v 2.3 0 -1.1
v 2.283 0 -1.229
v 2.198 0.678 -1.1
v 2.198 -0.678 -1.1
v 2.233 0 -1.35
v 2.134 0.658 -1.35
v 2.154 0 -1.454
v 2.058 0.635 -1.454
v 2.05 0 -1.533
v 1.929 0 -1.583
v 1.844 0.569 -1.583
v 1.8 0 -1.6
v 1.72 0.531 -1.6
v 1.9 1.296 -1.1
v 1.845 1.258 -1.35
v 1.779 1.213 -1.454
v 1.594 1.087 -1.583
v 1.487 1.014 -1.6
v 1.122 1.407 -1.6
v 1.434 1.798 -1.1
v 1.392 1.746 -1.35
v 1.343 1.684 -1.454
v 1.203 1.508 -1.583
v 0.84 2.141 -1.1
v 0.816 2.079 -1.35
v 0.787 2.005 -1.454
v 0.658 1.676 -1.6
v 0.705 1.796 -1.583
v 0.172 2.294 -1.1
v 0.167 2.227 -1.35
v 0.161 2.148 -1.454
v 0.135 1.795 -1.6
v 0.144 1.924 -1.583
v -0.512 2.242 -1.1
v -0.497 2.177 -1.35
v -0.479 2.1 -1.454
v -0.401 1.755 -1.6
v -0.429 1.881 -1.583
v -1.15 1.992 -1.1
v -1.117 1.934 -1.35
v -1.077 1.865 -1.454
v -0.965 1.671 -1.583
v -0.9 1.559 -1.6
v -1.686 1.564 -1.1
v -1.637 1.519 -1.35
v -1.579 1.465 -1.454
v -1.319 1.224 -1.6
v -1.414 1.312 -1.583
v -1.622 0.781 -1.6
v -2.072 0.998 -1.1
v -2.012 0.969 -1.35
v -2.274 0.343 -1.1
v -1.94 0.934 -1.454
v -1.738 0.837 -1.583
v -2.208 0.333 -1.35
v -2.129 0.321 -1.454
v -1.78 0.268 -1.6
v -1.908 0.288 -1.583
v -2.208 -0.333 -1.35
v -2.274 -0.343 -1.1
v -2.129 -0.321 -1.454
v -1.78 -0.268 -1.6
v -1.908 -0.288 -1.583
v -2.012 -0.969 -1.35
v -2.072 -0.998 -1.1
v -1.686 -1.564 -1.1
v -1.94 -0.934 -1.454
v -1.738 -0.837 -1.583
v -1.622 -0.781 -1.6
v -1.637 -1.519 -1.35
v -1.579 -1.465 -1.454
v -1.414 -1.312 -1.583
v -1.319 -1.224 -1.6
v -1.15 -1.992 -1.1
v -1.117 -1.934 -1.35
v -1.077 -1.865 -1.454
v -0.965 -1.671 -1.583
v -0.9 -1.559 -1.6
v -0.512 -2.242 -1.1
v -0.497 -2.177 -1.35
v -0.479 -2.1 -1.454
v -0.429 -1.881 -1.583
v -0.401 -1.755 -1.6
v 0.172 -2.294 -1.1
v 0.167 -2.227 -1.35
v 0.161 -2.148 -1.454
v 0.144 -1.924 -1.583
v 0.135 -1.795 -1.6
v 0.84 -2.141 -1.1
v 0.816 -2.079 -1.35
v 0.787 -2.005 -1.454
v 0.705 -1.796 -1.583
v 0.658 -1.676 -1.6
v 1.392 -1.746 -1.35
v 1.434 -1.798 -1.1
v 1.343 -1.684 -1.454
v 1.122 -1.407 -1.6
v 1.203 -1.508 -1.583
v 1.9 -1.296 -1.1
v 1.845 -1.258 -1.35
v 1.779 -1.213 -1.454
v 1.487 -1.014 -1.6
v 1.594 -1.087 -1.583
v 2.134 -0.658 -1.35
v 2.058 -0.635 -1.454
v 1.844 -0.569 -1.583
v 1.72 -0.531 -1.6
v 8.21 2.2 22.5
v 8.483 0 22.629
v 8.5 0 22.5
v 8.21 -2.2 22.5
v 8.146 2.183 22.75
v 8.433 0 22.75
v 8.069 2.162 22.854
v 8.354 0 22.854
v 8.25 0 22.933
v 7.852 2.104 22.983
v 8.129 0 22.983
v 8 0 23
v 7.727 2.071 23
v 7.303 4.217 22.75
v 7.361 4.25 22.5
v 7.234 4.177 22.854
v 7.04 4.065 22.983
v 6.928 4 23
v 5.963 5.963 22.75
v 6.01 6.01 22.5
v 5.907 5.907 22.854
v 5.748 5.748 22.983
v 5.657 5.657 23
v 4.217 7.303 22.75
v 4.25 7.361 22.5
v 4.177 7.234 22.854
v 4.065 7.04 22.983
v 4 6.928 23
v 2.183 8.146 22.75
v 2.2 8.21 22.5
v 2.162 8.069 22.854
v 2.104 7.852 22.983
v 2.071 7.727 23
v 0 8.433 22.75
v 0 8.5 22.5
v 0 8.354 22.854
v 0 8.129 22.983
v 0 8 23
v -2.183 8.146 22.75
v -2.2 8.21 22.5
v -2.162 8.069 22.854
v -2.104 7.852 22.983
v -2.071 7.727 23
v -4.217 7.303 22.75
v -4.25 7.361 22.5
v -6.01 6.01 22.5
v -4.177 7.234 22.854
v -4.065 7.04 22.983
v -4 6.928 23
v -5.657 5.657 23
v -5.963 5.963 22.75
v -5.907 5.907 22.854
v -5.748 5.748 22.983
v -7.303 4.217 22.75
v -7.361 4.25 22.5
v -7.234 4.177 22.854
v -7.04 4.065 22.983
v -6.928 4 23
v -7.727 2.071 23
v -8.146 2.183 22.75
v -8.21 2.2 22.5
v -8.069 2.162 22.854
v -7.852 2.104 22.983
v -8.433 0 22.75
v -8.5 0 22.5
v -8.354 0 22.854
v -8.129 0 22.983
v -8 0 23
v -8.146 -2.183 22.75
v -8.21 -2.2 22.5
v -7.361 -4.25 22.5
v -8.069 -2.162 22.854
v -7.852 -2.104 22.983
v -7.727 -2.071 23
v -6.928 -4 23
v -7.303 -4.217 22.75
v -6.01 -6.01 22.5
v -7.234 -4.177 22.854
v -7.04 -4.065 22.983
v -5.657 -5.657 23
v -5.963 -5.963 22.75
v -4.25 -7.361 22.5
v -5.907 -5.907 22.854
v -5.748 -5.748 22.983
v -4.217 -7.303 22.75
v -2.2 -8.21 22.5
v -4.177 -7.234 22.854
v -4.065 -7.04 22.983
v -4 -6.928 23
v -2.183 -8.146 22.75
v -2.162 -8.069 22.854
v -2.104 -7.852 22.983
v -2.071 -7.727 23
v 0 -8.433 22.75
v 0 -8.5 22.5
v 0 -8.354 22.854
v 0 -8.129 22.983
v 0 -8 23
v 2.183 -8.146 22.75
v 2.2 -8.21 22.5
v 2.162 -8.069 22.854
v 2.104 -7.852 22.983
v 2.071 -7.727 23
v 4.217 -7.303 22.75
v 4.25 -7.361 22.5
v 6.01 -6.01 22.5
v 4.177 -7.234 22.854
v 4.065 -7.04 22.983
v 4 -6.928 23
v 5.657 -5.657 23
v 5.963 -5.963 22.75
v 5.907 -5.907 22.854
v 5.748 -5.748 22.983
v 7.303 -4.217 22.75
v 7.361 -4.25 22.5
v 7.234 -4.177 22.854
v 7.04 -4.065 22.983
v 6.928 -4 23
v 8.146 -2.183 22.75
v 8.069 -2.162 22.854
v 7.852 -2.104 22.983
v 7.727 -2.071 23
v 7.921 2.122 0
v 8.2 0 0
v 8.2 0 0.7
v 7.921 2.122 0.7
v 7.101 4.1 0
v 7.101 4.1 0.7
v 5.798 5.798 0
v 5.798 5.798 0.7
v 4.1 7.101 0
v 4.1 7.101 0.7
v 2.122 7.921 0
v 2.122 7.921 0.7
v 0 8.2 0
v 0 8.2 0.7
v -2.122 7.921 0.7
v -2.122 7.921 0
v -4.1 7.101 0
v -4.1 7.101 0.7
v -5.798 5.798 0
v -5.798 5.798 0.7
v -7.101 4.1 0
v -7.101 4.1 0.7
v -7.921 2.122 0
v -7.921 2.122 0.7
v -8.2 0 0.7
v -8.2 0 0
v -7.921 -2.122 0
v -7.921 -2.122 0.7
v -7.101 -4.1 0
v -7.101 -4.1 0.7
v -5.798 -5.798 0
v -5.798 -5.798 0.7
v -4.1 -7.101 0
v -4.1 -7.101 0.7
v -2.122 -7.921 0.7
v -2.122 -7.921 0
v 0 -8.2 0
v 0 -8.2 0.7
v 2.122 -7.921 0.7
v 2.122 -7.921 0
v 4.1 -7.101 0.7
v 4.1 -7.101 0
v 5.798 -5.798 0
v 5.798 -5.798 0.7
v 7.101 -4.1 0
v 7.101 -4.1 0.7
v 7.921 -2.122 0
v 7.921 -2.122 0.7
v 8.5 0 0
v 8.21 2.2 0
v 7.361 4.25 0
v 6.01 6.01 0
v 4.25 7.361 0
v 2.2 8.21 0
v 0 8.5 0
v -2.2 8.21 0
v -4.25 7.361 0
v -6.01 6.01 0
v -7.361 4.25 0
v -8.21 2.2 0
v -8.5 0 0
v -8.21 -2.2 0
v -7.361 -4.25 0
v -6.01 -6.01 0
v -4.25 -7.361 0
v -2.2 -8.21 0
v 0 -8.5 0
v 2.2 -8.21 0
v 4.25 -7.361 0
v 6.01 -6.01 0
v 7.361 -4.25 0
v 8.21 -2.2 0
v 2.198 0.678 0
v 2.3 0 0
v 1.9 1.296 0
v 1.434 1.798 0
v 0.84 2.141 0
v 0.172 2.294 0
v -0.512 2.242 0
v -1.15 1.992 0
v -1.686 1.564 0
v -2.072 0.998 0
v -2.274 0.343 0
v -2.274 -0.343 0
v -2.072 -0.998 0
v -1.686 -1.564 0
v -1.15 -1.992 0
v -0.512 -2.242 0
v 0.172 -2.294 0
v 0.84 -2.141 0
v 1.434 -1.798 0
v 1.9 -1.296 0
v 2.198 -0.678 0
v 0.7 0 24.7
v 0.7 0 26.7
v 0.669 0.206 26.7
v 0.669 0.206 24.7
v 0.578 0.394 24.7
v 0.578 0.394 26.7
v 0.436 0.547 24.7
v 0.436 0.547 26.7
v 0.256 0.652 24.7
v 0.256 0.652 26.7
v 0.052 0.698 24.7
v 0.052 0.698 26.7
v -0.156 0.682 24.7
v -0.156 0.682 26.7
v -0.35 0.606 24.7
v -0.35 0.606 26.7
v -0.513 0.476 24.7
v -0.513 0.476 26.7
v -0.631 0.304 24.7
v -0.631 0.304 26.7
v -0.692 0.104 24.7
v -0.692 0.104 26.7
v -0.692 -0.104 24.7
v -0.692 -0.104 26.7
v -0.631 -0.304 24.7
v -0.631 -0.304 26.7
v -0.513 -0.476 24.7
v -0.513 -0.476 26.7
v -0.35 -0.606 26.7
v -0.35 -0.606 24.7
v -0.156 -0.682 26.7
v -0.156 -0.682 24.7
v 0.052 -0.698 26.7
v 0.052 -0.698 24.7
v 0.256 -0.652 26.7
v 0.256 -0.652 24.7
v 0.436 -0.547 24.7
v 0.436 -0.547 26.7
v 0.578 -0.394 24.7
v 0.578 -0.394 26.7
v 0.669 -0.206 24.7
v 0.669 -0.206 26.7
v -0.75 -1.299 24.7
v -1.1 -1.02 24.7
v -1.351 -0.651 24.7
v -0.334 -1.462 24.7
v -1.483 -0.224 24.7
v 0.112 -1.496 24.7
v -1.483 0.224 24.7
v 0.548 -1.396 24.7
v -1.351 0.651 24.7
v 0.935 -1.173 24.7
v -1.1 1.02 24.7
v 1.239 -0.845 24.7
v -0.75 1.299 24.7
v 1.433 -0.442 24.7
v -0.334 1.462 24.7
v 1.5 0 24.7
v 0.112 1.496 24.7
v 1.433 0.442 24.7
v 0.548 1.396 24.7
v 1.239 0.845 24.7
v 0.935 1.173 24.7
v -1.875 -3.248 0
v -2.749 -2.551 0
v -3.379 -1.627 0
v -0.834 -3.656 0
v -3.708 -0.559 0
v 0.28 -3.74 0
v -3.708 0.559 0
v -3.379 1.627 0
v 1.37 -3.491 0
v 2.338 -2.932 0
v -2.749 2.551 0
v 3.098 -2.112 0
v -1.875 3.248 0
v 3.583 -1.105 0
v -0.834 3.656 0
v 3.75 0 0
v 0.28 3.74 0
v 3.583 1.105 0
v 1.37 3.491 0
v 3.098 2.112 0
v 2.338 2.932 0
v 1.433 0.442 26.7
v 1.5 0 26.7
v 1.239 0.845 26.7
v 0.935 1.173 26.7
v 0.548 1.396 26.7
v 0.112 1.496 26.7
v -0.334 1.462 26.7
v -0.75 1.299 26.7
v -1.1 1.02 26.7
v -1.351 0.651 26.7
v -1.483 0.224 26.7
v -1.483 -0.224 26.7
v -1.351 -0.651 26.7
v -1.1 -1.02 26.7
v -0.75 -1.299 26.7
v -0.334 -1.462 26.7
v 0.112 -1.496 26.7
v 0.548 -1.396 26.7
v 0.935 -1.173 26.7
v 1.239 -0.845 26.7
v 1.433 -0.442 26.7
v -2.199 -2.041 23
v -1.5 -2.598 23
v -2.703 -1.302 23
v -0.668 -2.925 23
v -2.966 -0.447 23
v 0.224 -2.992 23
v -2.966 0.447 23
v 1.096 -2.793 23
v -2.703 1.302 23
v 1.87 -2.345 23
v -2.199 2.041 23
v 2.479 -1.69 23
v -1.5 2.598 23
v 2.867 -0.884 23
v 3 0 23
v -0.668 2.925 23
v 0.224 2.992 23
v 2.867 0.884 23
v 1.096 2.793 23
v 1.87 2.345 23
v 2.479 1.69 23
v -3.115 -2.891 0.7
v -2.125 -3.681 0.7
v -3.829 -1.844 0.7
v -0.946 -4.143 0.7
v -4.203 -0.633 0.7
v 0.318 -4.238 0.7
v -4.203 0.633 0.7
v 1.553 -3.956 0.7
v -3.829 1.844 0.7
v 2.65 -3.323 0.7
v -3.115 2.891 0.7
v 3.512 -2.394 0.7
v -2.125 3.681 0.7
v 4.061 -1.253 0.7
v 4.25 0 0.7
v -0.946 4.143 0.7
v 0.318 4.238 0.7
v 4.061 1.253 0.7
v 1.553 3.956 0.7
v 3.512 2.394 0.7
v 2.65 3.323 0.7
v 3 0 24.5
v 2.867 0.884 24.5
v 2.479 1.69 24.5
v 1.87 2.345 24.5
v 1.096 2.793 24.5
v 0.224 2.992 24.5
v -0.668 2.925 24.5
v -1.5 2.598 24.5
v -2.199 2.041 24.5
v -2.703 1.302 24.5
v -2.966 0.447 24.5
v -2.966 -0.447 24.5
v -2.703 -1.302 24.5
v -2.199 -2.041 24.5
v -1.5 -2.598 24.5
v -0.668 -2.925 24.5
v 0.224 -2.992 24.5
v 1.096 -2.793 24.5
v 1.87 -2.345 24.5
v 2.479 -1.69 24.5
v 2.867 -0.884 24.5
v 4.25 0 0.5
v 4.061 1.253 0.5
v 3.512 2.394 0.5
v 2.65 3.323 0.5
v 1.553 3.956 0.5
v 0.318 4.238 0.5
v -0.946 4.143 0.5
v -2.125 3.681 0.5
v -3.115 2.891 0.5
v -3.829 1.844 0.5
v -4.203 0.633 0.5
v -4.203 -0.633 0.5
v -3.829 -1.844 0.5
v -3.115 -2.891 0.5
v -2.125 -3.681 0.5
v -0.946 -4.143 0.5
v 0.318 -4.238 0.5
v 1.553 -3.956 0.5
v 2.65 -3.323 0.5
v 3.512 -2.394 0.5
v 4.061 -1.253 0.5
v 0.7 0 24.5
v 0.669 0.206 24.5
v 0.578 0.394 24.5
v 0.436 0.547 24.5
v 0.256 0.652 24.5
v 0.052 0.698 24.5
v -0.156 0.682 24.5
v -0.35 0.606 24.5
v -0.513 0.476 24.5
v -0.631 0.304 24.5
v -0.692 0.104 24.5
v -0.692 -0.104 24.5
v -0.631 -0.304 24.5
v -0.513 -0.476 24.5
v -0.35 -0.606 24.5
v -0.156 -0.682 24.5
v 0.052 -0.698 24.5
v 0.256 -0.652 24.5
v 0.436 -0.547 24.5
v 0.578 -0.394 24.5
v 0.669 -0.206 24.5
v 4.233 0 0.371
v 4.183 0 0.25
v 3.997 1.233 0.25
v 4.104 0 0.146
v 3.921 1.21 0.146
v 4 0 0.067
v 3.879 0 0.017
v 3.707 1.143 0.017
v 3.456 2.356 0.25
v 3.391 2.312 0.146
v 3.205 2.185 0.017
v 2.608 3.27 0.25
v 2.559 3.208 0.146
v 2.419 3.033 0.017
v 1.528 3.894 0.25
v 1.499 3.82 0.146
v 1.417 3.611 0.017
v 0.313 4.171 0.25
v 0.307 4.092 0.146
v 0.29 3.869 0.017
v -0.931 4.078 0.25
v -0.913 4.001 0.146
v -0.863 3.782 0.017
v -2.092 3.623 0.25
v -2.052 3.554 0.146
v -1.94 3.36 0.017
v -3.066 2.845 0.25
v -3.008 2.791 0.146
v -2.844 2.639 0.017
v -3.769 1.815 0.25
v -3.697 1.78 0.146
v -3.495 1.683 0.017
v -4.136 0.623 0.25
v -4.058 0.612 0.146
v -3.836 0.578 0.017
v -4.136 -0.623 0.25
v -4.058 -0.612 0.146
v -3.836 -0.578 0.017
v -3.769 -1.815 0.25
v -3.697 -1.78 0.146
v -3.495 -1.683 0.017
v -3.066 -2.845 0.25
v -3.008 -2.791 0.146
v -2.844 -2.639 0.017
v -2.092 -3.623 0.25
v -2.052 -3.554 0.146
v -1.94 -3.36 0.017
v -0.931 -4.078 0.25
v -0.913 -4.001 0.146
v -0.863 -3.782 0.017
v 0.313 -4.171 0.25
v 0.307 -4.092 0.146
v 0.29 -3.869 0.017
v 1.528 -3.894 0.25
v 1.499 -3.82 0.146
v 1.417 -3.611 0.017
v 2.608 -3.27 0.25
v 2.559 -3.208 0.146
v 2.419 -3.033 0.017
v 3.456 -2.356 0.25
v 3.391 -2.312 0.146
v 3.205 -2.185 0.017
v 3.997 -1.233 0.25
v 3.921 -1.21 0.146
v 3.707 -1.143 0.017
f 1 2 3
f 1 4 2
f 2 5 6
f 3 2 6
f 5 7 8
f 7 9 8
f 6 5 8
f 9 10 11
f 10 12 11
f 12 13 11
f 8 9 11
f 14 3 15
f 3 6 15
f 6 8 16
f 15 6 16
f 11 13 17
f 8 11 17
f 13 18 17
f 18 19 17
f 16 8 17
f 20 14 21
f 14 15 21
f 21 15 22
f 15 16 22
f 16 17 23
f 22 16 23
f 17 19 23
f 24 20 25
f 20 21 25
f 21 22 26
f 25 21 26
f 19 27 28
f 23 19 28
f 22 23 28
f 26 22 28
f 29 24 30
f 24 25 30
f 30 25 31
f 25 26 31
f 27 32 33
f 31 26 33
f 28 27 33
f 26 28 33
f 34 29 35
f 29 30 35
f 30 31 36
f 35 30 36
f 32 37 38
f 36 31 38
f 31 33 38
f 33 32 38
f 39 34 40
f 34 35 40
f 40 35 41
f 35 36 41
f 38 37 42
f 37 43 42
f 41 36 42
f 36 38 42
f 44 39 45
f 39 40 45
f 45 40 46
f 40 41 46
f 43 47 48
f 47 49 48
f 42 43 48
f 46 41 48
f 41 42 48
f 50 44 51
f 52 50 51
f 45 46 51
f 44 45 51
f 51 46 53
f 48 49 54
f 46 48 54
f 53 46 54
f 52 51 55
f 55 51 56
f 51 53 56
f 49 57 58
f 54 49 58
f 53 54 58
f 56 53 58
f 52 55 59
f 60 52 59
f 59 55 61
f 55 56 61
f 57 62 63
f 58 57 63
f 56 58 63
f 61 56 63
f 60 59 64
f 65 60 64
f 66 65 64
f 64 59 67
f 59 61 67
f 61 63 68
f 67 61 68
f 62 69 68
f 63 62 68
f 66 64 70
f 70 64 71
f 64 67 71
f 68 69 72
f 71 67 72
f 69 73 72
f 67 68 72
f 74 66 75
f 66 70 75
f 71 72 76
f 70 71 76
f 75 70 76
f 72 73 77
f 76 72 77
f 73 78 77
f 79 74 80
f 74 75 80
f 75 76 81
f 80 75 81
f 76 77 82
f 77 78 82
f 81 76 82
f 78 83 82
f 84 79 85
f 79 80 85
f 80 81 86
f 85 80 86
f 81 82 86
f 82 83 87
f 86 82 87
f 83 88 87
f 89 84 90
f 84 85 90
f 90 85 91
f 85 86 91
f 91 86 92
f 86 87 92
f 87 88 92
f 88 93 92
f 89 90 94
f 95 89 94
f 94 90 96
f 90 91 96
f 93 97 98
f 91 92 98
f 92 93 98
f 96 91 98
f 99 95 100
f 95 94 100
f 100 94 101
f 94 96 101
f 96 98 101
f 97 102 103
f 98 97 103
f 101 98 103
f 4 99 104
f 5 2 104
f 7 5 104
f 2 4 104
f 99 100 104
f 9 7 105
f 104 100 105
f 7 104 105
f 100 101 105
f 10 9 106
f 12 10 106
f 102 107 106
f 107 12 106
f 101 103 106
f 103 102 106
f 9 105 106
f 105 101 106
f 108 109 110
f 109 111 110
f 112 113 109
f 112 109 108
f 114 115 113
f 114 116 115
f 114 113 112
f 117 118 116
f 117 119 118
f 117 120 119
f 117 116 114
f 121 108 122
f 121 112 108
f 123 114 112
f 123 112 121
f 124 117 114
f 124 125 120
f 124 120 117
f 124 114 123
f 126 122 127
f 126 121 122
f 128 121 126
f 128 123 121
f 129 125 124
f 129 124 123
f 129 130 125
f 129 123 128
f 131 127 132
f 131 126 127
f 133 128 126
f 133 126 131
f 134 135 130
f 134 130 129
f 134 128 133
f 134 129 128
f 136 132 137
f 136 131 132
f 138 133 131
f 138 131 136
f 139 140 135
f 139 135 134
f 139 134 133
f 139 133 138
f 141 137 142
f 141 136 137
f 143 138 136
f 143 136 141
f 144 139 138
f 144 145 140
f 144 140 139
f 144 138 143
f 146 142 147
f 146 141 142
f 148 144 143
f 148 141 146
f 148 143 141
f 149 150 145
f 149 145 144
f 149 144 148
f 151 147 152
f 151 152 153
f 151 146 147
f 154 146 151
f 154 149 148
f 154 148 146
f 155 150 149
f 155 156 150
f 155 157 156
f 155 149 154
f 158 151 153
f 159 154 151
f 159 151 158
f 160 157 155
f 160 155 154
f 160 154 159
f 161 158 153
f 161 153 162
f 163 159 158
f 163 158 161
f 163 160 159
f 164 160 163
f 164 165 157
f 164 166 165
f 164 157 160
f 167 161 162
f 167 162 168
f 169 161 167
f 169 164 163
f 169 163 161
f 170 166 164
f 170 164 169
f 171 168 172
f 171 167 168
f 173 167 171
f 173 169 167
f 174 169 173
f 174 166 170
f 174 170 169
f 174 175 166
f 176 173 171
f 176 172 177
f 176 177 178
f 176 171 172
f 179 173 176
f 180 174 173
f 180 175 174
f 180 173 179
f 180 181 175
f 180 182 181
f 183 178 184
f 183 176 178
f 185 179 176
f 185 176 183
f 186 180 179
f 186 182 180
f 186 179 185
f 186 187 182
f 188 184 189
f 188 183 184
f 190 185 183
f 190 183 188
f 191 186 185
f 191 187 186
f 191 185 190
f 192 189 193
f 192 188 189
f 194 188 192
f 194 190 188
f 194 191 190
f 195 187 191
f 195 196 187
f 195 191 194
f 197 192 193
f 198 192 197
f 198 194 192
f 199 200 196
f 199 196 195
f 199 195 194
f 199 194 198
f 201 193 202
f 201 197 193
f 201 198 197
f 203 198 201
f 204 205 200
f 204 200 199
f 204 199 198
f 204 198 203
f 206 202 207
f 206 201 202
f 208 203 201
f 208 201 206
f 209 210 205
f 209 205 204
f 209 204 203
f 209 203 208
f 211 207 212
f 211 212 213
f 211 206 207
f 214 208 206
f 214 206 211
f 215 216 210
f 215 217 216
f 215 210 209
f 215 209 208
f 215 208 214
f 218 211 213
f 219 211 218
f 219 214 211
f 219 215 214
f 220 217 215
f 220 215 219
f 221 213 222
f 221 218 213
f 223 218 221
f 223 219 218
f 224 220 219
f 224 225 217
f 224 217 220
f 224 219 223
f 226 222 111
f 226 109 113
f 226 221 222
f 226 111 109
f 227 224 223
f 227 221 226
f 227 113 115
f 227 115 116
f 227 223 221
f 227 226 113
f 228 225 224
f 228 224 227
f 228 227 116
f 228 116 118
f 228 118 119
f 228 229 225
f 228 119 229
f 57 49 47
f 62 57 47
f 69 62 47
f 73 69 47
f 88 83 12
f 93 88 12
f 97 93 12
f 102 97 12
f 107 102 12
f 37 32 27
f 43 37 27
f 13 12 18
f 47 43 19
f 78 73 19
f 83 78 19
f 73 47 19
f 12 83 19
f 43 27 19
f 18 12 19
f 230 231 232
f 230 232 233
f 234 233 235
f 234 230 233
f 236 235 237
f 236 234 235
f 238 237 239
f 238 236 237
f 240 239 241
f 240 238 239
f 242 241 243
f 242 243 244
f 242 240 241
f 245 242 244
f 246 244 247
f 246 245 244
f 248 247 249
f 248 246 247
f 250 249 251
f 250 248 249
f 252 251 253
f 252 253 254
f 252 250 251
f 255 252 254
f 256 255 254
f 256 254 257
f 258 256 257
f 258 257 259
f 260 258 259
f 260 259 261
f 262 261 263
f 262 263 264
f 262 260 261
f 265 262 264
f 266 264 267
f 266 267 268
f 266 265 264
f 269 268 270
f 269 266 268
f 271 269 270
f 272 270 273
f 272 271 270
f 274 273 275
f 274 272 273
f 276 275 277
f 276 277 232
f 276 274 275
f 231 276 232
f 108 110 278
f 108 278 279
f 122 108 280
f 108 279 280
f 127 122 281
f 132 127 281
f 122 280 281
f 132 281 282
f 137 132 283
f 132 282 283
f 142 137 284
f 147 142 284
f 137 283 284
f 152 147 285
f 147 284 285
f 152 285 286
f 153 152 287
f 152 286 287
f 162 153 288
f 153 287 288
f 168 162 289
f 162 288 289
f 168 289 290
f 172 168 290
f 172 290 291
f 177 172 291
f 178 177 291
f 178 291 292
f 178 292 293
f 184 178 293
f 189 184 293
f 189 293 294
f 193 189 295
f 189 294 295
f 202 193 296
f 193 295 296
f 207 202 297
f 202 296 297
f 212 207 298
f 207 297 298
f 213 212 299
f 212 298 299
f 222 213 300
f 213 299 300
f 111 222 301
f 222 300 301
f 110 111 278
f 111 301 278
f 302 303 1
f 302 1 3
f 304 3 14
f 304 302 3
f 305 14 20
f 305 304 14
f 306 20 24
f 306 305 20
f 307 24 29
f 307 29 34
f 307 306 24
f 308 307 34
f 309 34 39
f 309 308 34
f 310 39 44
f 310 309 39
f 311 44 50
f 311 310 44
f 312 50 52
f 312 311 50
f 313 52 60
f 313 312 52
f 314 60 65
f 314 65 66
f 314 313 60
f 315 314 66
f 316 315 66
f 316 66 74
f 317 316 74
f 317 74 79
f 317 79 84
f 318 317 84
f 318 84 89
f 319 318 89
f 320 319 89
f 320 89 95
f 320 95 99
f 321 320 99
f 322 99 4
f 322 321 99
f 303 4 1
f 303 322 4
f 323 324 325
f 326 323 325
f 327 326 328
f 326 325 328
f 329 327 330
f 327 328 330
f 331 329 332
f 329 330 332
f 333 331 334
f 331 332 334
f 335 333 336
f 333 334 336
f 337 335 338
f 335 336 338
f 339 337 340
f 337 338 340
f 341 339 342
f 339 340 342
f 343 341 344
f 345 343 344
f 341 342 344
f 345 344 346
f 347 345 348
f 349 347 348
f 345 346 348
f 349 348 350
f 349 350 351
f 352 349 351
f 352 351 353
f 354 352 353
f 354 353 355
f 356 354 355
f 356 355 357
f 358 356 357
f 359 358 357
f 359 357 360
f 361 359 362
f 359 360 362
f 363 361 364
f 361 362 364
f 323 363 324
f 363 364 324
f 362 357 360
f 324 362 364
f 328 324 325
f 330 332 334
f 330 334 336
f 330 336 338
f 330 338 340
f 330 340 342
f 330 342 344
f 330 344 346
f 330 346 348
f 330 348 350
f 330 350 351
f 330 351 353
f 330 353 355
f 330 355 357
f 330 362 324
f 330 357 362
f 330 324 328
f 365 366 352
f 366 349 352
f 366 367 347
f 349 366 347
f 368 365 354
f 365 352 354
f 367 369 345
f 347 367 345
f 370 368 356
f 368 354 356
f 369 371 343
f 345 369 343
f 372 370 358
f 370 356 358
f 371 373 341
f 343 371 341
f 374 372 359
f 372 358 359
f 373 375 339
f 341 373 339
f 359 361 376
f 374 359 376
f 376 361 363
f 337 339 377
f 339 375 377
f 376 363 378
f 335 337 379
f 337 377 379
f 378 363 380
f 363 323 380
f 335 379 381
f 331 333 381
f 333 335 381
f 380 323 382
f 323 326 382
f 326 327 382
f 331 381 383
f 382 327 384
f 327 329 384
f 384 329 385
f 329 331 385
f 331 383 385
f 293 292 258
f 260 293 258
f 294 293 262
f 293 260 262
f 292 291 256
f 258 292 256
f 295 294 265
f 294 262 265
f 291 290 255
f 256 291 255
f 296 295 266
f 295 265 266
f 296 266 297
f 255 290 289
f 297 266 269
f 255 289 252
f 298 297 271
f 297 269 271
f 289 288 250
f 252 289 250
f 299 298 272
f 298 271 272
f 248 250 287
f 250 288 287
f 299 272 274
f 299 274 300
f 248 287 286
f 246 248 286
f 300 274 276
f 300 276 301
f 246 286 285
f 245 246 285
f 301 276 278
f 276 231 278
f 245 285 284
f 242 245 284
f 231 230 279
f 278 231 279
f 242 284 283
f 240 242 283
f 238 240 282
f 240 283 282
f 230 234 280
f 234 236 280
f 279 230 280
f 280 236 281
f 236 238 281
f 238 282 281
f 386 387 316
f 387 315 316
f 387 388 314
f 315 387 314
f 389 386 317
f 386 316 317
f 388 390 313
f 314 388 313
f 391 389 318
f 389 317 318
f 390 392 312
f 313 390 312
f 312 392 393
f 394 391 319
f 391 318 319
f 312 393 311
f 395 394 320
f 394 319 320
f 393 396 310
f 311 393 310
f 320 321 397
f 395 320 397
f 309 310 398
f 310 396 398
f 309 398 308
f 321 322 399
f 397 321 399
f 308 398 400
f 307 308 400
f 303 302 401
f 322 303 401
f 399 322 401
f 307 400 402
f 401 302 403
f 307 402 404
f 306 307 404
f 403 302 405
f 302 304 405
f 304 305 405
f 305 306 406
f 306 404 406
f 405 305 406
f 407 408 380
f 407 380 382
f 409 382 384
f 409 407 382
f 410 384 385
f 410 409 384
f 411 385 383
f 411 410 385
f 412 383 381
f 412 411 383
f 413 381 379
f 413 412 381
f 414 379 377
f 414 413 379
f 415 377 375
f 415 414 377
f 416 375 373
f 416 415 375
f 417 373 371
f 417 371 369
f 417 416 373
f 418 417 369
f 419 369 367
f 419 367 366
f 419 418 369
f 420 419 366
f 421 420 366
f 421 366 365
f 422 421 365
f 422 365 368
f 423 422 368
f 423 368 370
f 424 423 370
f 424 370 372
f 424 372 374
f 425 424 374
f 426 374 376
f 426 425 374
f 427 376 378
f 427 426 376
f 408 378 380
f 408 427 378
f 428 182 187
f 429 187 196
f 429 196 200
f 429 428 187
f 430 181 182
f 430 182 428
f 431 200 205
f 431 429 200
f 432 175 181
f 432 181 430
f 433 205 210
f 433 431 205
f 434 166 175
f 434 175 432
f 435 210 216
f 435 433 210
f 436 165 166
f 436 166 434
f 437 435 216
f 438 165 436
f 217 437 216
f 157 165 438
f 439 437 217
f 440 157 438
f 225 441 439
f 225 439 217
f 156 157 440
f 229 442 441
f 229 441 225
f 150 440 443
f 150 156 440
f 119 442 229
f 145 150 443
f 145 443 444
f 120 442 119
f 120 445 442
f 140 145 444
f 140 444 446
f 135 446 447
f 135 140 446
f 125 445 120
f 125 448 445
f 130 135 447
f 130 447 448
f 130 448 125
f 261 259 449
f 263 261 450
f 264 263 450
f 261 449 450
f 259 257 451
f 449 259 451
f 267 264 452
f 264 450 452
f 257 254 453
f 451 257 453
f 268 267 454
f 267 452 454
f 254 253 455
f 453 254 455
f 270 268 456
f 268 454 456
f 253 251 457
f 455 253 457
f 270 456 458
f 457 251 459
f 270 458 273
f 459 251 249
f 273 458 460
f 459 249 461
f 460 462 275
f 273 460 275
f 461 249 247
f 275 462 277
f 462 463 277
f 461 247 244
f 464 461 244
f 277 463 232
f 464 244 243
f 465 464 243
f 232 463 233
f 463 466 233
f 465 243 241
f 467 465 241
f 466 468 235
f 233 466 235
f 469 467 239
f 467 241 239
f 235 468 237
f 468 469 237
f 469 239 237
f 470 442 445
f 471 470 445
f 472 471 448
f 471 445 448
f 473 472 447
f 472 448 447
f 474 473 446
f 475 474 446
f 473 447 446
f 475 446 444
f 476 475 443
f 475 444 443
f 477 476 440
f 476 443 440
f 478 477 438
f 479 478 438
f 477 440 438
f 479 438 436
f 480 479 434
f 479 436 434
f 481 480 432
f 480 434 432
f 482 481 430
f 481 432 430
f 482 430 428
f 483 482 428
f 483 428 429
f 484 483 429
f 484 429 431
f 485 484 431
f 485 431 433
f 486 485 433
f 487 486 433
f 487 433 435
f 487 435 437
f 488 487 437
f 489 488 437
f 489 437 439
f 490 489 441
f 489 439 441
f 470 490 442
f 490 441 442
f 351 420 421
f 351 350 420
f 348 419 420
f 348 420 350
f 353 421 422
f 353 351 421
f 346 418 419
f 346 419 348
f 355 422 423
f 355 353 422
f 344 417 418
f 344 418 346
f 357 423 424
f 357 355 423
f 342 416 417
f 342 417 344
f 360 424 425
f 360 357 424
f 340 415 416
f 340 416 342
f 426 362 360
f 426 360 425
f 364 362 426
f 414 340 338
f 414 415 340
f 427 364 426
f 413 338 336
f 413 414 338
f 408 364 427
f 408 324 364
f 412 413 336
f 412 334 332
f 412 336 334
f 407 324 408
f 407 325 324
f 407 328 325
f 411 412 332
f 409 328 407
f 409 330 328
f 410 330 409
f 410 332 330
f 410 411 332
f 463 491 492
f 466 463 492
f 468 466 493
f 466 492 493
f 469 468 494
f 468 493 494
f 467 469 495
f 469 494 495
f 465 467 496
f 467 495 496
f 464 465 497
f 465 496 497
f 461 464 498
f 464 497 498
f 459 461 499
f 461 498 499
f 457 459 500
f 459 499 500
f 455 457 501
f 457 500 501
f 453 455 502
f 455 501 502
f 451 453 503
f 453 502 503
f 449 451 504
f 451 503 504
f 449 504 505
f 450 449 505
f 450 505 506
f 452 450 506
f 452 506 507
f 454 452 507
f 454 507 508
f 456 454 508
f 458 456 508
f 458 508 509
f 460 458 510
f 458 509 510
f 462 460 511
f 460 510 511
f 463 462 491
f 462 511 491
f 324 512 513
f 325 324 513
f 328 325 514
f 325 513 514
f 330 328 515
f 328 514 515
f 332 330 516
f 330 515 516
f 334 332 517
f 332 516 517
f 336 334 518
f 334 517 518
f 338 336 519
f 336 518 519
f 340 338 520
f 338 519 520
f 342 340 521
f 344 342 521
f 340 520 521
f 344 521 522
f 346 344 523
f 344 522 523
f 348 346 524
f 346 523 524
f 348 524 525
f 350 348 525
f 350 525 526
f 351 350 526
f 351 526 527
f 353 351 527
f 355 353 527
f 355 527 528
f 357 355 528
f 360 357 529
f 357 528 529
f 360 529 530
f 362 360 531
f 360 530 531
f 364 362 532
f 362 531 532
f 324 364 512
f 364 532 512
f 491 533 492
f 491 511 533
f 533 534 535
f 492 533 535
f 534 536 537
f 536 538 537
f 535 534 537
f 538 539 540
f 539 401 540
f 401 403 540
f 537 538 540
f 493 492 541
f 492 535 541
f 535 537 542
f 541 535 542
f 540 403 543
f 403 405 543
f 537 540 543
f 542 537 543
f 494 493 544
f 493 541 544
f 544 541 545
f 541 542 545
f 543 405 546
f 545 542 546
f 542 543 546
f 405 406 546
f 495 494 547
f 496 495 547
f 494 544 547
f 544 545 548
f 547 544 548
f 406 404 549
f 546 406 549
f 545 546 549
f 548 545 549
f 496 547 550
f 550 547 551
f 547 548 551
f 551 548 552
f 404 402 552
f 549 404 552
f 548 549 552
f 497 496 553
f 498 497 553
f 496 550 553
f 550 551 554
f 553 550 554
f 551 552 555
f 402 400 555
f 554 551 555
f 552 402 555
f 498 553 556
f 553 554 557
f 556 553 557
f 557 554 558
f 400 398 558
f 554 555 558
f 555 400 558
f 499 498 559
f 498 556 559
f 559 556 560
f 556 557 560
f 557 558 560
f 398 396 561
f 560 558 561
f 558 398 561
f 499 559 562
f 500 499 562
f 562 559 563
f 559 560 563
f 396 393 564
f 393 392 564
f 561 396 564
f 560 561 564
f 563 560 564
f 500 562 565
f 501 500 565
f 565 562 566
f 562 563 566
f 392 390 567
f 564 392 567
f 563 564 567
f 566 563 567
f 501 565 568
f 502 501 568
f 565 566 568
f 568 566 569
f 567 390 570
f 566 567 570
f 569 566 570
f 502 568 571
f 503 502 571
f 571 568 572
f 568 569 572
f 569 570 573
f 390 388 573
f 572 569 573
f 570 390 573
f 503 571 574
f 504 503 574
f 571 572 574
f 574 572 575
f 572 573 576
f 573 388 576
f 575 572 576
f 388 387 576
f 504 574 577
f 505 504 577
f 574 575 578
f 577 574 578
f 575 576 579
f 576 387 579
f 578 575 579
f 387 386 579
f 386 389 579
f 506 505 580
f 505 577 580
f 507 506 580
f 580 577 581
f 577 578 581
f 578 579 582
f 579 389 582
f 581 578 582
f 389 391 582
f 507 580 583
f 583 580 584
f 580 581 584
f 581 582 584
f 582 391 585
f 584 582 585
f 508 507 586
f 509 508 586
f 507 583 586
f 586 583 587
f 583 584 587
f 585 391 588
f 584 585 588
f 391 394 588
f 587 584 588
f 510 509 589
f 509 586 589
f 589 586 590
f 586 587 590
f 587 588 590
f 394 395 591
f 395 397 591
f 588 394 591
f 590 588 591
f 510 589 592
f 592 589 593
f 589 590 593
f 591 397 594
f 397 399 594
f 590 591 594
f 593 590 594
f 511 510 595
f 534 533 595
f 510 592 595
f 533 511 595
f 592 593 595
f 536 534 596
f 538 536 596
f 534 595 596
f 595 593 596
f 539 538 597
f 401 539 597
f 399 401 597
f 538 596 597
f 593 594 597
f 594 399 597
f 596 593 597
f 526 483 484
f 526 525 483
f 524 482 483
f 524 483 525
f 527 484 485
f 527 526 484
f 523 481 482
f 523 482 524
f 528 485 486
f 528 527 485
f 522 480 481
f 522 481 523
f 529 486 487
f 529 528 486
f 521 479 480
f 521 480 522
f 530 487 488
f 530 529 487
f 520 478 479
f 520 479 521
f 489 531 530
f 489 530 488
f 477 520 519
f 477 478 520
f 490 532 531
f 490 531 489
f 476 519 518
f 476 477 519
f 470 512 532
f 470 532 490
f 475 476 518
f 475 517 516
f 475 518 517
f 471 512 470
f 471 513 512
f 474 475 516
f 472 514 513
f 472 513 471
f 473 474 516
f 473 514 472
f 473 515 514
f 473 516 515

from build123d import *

# Parameters (mm, degrees)
F0_R      = 8.5
F0_R_2    = 8.2
F1_DEPTH  = 23
F2_DEPTH  = 0.7
F3_R      = 4.25
F4_DEPTH  = 0.7
F5_R      = 2.3
F6_DEPTH  = 1.6
F7_R      = 0.5
F8_R      = 3
F9_DEPTH  = 1.5
F10_R     = 0.7
F11_DEPTH = 2.2
F12_R     = 1.5
F12_R_2   = 0.7
F13_DEPTH = 2


with BuildPart() as f1:
    # F0 (on Top) → F1 (new body)
    with BuildSketch(Plane.XY):
        Circle(F0_R)
        Circle(F0_R_2, mode=Mode.SUBTRACT)
        Circle(F0_R_2)
    extrude(amount=F1_DEPTH)

    # F0 (on Top) → F2 (cut)
    with BuildSketch(Plane.XY):
        Circle(F0_R_2)
    extrude(amount=F2_DEPTH, mode=Mode.SUBTRACT)

    # F3 (on face) → F4 (join)
    with BuildSketch(Plane.XY):
        Circle(F3_R)
    extrude(amount=F4_DEPTH)

    # F5 (on face) → F6 (join)
    with BuildSketch(Plane.XY):
        Circle(F5_R)
    extrude(amount=-F6_DEPTH)

    # F7
    f7_edges = [f1.edges().sort_by_distance(p)[0] for p in [
        (-4.25, 0, 0),
        (-2.3, 0, -1.6),
        (-8.5, 0, 23),
    ]]
    fillet(f7_edges, radius=F7_R)

    # F8 (on face) → F9 (join)
    with BuildSketch(Plane.XY.offset(23)):
        Circle(F8_R)
    extrude(amount=F9_DEPTH)

    # F10 (on face) → F11 (join)
    with BuildSketch(Plane.XY.offset(24.5)):
        Circle(F10_R)
    extrude(amount=F11_DEPTH)


with BuildPart() as f13:
    # F12 (on face) → F13 (new body)
    with BuildSketch(Plane.XY.offset(26.7)):
        Circle(F12_R)
        Circle(F12_R_2, mode=Mode.SUBTRACT)
    extrude(amount=-F13_DEPTH)


solid = Compound([f1.part, f13.part])
